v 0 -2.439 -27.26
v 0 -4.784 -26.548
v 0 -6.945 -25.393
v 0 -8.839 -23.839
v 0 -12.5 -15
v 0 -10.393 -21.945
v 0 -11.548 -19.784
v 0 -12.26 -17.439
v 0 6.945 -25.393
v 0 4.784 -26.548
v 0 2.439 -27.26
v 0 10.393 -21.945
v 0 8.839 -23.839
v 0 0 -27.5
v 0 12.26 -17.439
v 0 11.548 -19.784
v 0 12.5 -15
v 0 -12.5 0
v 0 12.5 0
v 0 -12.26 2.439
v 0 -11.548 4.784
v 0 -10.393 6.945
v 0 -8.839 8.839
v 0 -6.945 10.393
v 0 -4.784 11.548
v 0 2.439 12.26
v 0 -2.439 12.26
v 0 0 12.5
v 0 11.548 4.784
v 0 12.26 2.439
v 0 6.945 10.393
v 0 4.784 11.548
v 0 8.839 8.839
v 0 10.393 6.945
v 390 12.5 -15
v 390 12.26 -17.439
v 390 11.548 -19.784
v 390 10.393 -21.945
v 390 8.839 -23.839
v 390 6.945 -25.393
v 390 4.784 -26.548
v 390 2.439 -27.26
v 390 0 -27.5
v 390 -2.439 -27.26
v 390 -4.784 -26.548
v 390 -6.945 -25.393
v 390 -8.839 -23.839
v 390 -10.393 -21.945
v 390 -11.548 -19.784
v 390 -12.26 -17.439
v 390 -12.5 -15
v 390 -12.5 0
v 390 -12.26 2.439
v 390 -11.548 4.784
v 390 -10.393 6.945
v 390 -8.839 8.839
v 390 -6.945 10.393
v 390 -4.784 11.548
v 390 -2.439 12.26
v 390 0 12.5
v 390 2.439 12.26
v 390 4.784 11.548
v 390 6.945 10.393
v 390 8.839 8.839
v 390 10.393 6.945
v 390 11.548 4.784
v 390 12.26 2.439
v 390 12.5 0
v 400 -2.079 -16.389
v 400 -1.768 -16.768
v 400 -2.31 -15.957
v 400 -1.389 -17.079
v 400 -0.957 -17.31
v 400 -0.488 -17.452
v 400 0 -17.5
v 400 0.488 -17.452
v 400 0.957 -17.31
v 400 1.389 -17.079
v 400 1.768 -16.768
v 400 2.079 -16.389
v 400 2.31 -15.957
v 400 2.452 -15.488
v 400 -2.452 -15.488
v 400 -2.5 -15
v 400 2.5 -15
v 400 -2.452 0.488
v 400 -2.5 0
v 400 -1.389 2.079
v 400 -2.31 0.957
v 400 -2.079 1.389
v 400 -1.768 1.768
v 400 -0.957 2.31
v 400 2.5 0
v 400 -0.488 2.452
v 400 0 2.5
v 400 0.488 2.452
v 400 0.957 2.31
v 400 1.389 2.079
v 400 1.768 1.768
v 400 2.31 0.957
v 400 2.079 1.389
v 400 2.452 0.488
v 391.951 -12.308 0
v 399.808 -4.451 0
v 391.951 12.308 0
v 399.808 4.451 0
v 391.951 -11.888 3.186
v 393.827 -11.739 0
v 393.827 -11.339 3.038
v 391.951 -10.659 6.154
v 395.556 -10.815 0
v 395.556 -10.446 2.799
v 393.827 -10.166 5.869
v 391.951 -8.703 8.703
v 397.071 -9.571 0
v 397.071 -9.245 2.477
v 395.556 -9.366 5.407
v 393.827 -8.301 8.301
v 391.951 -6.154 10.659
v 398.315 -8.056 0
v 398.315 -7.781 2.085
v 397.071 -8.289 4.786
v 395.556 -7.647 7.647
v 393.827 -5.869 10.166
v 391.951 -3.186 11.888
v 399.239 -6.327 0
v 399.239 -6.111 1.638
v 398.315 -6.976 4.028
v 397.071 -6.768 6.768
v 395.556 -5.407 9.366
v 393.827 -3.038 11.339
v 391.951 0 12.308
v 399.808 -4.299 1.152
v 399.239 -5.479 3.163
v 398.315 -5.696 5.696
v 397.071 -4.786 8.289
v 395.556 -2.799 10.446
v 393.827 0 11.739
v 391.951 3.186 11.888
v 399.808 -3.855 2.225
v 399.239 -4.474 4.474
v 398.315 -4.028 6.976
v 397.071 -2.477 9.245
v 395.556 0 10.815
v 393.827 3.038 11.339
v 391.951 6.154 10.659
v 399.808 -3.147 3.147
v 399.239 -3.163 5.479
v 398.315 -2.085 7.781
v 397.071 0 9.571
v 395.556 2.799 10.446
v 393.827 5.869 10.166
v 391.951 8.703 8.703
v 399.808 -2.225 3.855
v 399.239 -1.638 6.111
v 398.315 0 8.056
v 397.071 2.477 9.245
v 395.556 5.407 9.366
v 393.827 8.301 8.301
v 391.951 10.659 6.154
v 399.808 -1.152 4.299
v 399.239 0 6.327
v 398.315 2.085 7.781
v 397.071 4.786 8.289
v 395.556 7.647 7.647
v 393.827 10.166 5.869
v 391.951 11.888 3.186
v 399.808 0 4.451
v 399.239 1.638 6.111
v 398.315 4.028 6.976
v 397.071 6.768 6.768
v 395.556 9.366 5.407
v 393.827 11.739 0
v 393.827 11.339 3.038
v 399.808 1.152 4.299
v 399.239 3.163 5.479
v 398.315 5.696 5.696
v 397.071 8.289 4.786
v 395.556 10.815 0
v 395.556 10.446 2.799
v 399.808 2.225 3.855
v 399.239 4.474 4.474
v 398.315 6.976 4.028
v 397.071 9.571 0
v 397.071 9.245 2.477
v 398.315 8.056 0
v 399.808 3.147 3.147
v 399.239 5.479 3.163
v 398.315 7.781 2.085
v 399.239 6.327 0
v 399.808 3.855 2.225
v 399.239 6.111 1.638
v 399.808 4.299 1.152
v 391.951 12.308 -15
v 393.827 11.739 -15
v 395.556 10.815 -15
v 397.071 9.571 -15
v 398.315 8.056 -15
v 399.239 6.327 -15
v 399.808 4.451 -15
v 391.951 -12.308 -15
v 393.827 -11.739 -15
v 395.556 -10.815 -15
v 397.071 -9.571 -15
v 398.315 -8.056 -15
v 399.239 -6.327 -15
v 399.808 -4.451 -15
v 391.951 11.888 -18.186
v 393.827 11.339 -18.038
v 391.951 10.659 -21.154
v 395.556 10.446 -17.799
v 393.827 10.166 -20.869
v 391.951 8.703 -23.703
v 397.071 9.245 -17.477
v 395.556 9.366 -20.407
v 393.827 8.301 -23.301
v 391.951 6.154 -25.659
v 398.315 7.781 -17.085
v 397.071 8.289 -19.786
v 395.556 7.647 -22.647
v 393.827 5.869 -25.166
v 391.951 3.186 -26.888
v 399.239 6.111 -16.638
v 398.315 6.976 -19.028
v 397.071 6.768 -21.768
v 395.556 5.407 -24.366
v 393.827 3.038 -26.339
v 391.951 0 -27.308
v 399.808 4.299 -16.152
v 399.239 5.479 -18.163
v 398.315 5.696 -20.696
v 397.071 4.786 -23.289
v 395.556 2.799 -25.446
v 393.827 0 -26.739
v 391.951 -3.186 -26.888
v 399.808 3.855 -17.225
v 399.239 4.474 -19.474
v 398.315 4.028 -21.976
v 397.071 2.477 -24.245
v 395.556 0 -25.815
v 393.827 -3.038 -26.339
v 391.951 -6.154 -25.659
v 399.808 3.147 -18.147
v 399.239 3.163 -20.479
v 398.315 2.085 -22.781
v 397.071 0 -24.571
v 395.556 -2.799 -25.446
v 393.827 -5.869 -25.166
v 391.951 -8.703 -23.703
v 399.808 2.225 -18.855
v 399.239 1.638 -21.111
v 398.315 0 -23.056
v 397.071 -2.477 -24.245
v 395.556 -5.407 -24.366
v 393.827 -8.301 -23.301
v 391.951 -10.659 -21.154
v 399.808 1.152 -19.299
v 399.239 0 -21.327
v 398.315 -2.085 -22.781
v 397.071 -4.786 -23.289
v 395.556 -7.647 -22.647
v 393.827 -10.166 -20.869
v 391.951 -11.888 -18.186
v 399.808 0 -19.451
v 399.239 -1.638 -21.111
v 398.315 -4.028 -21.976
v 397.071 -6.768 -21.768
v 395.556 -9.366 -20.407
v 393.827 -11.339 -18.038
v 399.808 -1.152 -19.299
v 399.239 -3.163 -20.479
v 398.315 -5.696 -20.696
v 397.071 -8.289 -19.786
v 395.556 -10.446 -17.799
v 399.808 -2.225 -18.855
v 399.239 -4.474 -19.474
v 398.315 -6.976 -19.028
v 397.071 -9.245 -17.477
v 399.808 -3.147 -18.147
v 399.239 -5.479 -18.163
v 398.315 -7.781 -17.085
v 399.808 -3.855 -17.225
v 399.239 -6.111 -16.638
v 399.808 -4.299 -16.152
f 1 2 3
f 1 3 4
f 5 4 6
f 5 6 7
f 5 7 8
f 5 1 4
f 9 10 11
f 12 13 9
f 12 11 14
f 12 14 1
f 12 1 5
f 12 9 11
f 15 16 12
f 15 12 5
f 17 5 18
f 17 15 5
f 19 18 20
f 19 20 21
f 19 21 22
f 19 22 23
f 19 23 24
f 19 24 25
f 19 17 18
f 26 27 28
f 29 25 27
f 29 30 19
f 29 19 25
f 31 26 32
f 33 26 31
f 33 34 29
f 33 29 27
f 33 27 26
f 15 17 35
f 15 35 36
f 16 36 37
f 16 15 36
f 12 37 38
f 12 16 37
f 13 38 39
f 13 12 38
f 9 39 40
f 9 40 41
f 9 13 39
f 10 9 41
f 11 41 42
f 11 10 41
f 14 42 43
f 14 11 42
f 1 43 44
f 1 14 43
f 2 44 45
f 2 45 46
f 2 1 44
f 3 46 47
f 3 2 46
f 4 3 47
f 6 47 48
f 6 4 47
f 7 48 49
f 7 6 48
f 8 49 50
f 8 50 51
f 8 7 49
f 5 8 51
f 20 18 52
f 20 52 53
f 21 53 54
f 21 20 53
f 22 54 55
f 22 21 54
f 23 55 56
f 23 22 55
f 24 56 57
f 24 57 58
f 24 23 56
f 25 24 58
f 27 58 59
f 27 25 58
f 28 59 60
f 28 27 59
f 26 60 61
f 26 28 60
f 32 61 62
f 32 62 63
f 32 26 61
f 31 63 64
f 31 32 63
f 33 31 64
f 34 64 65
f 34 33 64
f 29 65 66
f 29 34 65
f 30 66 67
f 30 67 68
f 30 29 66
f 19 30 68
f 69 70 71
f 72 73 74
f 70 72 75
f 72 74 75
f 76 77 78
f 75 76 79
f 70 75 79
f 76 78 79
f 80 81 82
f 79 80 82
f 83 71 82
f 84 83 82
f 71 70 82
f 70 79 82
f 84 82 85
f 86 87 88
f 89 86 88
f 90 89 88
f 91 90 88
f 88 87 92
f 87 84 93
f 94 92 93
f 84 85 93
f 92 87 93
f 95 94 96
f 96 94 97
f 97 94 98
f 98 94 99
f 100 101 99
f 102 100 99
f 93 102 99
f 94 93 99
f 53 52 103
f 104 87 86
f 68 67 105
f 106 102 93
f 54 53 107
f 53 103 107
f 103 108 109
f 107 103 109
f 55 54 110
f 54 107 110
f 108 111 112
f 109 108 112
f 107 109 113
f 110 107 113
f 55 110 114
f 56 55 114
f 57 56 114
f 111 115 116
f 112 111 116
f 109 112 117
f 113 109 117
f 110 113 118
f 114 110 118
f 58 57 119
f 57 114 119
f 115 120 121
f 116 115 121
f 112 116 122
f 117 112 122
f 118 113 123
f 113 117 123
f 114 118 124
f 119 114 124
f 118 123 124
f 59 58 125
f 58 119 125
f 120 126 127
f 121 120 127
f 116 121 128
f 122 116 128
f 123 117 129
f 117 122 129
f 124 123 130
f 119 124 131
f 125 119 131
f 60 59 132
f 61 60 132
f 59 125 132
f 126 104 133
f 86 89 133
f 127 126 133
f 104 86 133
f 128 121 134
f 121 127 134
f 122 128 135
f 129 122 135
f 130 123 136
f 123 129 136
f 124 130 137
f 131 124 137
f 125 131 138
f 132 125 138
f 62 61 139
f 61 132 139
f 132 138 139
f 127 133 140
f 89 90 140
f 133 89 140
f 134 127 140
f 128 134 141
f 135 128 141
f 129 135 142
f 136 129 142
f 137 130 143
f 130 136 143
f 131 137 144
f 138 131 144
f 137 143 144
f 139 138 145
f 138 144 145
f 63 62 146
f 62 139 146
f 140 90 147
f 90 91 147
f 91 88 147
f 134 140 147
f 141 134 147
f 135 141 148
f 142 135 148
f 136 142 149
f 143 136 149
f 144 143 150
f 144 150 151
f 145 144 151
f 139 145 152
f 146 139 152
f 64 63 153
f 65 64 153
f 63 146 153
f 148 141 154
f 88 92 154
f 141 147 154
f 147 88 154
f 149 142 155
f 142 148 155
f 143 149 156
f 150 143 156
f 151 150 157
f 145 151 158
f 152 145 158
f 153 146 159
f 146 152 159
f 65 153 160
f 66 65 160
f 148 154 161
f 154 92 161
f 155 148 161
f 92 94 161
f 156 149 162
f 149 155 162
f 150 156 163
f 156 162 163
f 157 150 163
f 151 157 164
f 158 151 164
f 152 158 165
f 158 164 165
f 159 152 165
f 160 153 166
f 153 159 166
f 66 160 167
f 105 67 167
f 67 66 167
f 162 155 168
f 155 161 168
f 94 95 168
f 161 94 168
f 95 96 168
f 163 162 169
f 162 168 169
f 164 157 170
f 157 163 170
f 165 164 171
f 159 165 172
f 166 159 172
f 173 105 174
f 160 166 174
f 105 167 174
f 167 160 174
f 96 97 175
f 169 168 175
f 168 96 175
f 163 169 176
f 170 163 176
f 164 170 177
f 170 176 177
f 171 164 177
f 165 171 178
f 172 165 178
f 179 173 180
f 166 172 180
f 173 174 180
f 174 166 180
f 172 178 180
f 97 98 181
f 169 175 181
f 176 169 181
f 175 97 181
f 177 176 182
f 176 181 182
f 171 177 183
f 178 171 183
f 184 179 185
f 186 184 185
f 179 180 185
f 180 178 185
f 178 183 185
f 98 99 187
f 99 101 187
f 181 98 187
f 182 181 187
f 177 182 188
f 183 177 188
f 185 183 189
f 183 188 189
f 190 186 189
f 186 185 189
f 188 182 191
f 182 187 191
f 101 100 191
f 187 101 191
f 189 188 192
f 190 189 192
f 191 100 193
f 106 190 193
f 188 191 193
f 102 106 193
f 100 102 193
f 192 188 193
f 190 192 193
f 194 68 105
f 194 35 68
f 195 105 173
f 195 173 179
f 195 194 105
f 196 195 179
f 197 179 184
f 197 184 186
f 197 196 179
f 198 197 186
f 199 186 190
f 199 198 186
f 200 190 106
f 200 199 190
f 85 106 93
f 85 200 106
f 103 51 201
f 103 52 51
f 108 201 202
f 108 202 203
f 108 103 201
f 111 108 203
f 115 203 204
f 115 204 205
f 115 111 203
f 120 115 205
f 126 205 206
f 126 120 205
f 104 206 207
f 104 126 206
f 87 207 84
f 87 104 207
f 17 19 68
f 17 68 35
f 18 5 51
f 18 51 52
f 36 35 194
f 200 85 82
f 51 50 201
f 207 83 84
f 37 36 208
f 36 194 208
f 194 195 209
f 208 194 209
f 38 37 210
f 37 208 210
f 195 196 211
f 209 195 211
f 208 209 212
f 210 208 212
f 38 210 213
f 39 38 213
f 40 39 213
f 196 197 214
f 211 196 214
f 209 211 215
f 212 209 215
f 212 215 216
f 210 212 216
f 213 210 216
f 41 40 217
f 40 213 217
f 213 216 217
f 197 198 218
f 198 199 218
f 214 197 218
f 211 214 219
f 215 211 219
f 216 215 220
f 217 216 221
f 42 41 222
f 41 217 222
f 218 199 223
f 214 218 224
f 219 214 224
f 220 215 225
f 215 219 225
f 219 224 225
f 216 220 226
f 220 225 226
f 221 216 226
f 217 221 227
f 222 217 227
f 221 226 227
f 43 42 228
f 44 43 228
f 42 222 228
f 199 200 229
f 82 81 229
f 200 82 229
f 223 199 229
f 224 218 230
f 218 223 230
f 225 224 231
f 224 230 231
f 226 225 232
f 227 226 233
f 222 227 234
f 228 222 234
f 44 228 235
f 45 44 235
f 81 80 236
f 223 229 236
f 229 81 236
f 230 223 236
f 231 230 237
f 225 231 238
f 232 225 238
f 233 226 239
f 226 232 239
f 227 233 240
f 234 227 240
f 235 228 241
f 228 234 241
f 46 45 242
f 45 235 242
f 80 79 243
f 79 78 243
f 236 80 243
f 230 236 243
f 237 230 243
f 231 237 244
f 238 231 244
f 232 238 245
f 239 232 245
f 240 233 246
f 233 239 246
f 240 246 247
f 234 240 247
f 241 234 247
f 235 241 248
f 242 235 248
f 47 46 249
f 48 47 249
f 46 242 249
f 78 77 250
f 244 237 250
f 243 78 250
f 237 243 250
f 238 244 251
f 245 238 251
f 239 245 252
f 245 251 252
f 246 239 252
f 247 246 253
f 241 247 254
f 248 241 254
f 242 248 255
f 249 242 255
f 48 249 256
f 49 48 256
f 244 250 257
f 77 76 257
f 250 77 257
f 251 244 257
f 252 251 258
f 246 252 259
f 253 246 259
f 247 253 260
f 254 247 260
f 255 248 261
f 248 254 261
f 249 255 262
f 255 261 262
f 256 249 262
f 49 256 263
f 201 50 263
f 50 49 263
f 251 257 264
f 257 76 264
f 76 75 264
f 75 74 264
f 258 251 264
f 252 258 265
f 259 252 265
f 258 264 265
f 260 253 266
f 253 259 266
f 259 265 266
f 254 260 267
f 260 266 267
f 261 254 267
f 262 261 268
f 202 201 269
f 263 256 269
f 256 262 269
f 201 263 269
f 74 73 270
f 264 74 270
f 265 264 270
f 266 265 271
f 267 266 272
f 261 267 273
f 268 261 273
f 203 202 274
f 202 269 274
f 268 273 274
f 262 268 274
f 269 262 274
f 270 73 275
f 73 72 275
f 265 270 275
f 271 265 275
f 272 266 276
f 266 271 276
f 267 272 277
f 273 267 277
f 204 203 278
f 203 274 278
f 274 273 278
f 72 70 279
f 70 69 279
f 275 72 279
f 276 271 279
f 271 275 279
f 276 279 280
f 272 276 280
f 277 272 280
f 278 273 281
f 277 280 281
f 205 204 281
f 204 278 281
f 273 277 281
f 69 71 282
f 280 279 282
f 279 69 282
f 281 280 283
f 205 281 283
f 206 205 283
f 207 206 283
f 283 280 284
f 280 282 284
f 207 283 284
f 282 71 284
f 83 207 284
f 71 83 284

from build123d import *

# Parameters (mm, degrees)
SALIENTE_EXTRUIR1_DEPTH = 400
REDONDEO1_R             = 10


with BuildPart() as part:
    # Croquis1 → Saliente-Extruir1 (new body)
    with BuildSketch(Plane(origin=(0, 0, 0), x_dir=(0, 0, -1), z_dir=(1, 0, 0))):
        with BuildLine():
            Line((0, 12.5), (15, 12.5))
            ThreePointArc((15, 12.5), (27.5, 0), (15, -12.5))
            Line((15, -12.5), (0, -12.5))
            ThreePointArc((0, -12.5), (-12.5, 0), (0, 12.5))
        make_face()
    extrude(amount=SALIENTE_EXTRUIR1_DEPTH)

    # Redondeo1
    redondeo1_edges = [part.edges().sort_by_distance(p)[0] for p in [
        (400, 0, -27.5),
        (400, 12.5, -7.5),
        (400, 0, 12.5),
        (400, -12.5, -7.5),
    ]]
    fillet(redondeo1_edges, radius=REDONDEO1_R)


solid = part.part
